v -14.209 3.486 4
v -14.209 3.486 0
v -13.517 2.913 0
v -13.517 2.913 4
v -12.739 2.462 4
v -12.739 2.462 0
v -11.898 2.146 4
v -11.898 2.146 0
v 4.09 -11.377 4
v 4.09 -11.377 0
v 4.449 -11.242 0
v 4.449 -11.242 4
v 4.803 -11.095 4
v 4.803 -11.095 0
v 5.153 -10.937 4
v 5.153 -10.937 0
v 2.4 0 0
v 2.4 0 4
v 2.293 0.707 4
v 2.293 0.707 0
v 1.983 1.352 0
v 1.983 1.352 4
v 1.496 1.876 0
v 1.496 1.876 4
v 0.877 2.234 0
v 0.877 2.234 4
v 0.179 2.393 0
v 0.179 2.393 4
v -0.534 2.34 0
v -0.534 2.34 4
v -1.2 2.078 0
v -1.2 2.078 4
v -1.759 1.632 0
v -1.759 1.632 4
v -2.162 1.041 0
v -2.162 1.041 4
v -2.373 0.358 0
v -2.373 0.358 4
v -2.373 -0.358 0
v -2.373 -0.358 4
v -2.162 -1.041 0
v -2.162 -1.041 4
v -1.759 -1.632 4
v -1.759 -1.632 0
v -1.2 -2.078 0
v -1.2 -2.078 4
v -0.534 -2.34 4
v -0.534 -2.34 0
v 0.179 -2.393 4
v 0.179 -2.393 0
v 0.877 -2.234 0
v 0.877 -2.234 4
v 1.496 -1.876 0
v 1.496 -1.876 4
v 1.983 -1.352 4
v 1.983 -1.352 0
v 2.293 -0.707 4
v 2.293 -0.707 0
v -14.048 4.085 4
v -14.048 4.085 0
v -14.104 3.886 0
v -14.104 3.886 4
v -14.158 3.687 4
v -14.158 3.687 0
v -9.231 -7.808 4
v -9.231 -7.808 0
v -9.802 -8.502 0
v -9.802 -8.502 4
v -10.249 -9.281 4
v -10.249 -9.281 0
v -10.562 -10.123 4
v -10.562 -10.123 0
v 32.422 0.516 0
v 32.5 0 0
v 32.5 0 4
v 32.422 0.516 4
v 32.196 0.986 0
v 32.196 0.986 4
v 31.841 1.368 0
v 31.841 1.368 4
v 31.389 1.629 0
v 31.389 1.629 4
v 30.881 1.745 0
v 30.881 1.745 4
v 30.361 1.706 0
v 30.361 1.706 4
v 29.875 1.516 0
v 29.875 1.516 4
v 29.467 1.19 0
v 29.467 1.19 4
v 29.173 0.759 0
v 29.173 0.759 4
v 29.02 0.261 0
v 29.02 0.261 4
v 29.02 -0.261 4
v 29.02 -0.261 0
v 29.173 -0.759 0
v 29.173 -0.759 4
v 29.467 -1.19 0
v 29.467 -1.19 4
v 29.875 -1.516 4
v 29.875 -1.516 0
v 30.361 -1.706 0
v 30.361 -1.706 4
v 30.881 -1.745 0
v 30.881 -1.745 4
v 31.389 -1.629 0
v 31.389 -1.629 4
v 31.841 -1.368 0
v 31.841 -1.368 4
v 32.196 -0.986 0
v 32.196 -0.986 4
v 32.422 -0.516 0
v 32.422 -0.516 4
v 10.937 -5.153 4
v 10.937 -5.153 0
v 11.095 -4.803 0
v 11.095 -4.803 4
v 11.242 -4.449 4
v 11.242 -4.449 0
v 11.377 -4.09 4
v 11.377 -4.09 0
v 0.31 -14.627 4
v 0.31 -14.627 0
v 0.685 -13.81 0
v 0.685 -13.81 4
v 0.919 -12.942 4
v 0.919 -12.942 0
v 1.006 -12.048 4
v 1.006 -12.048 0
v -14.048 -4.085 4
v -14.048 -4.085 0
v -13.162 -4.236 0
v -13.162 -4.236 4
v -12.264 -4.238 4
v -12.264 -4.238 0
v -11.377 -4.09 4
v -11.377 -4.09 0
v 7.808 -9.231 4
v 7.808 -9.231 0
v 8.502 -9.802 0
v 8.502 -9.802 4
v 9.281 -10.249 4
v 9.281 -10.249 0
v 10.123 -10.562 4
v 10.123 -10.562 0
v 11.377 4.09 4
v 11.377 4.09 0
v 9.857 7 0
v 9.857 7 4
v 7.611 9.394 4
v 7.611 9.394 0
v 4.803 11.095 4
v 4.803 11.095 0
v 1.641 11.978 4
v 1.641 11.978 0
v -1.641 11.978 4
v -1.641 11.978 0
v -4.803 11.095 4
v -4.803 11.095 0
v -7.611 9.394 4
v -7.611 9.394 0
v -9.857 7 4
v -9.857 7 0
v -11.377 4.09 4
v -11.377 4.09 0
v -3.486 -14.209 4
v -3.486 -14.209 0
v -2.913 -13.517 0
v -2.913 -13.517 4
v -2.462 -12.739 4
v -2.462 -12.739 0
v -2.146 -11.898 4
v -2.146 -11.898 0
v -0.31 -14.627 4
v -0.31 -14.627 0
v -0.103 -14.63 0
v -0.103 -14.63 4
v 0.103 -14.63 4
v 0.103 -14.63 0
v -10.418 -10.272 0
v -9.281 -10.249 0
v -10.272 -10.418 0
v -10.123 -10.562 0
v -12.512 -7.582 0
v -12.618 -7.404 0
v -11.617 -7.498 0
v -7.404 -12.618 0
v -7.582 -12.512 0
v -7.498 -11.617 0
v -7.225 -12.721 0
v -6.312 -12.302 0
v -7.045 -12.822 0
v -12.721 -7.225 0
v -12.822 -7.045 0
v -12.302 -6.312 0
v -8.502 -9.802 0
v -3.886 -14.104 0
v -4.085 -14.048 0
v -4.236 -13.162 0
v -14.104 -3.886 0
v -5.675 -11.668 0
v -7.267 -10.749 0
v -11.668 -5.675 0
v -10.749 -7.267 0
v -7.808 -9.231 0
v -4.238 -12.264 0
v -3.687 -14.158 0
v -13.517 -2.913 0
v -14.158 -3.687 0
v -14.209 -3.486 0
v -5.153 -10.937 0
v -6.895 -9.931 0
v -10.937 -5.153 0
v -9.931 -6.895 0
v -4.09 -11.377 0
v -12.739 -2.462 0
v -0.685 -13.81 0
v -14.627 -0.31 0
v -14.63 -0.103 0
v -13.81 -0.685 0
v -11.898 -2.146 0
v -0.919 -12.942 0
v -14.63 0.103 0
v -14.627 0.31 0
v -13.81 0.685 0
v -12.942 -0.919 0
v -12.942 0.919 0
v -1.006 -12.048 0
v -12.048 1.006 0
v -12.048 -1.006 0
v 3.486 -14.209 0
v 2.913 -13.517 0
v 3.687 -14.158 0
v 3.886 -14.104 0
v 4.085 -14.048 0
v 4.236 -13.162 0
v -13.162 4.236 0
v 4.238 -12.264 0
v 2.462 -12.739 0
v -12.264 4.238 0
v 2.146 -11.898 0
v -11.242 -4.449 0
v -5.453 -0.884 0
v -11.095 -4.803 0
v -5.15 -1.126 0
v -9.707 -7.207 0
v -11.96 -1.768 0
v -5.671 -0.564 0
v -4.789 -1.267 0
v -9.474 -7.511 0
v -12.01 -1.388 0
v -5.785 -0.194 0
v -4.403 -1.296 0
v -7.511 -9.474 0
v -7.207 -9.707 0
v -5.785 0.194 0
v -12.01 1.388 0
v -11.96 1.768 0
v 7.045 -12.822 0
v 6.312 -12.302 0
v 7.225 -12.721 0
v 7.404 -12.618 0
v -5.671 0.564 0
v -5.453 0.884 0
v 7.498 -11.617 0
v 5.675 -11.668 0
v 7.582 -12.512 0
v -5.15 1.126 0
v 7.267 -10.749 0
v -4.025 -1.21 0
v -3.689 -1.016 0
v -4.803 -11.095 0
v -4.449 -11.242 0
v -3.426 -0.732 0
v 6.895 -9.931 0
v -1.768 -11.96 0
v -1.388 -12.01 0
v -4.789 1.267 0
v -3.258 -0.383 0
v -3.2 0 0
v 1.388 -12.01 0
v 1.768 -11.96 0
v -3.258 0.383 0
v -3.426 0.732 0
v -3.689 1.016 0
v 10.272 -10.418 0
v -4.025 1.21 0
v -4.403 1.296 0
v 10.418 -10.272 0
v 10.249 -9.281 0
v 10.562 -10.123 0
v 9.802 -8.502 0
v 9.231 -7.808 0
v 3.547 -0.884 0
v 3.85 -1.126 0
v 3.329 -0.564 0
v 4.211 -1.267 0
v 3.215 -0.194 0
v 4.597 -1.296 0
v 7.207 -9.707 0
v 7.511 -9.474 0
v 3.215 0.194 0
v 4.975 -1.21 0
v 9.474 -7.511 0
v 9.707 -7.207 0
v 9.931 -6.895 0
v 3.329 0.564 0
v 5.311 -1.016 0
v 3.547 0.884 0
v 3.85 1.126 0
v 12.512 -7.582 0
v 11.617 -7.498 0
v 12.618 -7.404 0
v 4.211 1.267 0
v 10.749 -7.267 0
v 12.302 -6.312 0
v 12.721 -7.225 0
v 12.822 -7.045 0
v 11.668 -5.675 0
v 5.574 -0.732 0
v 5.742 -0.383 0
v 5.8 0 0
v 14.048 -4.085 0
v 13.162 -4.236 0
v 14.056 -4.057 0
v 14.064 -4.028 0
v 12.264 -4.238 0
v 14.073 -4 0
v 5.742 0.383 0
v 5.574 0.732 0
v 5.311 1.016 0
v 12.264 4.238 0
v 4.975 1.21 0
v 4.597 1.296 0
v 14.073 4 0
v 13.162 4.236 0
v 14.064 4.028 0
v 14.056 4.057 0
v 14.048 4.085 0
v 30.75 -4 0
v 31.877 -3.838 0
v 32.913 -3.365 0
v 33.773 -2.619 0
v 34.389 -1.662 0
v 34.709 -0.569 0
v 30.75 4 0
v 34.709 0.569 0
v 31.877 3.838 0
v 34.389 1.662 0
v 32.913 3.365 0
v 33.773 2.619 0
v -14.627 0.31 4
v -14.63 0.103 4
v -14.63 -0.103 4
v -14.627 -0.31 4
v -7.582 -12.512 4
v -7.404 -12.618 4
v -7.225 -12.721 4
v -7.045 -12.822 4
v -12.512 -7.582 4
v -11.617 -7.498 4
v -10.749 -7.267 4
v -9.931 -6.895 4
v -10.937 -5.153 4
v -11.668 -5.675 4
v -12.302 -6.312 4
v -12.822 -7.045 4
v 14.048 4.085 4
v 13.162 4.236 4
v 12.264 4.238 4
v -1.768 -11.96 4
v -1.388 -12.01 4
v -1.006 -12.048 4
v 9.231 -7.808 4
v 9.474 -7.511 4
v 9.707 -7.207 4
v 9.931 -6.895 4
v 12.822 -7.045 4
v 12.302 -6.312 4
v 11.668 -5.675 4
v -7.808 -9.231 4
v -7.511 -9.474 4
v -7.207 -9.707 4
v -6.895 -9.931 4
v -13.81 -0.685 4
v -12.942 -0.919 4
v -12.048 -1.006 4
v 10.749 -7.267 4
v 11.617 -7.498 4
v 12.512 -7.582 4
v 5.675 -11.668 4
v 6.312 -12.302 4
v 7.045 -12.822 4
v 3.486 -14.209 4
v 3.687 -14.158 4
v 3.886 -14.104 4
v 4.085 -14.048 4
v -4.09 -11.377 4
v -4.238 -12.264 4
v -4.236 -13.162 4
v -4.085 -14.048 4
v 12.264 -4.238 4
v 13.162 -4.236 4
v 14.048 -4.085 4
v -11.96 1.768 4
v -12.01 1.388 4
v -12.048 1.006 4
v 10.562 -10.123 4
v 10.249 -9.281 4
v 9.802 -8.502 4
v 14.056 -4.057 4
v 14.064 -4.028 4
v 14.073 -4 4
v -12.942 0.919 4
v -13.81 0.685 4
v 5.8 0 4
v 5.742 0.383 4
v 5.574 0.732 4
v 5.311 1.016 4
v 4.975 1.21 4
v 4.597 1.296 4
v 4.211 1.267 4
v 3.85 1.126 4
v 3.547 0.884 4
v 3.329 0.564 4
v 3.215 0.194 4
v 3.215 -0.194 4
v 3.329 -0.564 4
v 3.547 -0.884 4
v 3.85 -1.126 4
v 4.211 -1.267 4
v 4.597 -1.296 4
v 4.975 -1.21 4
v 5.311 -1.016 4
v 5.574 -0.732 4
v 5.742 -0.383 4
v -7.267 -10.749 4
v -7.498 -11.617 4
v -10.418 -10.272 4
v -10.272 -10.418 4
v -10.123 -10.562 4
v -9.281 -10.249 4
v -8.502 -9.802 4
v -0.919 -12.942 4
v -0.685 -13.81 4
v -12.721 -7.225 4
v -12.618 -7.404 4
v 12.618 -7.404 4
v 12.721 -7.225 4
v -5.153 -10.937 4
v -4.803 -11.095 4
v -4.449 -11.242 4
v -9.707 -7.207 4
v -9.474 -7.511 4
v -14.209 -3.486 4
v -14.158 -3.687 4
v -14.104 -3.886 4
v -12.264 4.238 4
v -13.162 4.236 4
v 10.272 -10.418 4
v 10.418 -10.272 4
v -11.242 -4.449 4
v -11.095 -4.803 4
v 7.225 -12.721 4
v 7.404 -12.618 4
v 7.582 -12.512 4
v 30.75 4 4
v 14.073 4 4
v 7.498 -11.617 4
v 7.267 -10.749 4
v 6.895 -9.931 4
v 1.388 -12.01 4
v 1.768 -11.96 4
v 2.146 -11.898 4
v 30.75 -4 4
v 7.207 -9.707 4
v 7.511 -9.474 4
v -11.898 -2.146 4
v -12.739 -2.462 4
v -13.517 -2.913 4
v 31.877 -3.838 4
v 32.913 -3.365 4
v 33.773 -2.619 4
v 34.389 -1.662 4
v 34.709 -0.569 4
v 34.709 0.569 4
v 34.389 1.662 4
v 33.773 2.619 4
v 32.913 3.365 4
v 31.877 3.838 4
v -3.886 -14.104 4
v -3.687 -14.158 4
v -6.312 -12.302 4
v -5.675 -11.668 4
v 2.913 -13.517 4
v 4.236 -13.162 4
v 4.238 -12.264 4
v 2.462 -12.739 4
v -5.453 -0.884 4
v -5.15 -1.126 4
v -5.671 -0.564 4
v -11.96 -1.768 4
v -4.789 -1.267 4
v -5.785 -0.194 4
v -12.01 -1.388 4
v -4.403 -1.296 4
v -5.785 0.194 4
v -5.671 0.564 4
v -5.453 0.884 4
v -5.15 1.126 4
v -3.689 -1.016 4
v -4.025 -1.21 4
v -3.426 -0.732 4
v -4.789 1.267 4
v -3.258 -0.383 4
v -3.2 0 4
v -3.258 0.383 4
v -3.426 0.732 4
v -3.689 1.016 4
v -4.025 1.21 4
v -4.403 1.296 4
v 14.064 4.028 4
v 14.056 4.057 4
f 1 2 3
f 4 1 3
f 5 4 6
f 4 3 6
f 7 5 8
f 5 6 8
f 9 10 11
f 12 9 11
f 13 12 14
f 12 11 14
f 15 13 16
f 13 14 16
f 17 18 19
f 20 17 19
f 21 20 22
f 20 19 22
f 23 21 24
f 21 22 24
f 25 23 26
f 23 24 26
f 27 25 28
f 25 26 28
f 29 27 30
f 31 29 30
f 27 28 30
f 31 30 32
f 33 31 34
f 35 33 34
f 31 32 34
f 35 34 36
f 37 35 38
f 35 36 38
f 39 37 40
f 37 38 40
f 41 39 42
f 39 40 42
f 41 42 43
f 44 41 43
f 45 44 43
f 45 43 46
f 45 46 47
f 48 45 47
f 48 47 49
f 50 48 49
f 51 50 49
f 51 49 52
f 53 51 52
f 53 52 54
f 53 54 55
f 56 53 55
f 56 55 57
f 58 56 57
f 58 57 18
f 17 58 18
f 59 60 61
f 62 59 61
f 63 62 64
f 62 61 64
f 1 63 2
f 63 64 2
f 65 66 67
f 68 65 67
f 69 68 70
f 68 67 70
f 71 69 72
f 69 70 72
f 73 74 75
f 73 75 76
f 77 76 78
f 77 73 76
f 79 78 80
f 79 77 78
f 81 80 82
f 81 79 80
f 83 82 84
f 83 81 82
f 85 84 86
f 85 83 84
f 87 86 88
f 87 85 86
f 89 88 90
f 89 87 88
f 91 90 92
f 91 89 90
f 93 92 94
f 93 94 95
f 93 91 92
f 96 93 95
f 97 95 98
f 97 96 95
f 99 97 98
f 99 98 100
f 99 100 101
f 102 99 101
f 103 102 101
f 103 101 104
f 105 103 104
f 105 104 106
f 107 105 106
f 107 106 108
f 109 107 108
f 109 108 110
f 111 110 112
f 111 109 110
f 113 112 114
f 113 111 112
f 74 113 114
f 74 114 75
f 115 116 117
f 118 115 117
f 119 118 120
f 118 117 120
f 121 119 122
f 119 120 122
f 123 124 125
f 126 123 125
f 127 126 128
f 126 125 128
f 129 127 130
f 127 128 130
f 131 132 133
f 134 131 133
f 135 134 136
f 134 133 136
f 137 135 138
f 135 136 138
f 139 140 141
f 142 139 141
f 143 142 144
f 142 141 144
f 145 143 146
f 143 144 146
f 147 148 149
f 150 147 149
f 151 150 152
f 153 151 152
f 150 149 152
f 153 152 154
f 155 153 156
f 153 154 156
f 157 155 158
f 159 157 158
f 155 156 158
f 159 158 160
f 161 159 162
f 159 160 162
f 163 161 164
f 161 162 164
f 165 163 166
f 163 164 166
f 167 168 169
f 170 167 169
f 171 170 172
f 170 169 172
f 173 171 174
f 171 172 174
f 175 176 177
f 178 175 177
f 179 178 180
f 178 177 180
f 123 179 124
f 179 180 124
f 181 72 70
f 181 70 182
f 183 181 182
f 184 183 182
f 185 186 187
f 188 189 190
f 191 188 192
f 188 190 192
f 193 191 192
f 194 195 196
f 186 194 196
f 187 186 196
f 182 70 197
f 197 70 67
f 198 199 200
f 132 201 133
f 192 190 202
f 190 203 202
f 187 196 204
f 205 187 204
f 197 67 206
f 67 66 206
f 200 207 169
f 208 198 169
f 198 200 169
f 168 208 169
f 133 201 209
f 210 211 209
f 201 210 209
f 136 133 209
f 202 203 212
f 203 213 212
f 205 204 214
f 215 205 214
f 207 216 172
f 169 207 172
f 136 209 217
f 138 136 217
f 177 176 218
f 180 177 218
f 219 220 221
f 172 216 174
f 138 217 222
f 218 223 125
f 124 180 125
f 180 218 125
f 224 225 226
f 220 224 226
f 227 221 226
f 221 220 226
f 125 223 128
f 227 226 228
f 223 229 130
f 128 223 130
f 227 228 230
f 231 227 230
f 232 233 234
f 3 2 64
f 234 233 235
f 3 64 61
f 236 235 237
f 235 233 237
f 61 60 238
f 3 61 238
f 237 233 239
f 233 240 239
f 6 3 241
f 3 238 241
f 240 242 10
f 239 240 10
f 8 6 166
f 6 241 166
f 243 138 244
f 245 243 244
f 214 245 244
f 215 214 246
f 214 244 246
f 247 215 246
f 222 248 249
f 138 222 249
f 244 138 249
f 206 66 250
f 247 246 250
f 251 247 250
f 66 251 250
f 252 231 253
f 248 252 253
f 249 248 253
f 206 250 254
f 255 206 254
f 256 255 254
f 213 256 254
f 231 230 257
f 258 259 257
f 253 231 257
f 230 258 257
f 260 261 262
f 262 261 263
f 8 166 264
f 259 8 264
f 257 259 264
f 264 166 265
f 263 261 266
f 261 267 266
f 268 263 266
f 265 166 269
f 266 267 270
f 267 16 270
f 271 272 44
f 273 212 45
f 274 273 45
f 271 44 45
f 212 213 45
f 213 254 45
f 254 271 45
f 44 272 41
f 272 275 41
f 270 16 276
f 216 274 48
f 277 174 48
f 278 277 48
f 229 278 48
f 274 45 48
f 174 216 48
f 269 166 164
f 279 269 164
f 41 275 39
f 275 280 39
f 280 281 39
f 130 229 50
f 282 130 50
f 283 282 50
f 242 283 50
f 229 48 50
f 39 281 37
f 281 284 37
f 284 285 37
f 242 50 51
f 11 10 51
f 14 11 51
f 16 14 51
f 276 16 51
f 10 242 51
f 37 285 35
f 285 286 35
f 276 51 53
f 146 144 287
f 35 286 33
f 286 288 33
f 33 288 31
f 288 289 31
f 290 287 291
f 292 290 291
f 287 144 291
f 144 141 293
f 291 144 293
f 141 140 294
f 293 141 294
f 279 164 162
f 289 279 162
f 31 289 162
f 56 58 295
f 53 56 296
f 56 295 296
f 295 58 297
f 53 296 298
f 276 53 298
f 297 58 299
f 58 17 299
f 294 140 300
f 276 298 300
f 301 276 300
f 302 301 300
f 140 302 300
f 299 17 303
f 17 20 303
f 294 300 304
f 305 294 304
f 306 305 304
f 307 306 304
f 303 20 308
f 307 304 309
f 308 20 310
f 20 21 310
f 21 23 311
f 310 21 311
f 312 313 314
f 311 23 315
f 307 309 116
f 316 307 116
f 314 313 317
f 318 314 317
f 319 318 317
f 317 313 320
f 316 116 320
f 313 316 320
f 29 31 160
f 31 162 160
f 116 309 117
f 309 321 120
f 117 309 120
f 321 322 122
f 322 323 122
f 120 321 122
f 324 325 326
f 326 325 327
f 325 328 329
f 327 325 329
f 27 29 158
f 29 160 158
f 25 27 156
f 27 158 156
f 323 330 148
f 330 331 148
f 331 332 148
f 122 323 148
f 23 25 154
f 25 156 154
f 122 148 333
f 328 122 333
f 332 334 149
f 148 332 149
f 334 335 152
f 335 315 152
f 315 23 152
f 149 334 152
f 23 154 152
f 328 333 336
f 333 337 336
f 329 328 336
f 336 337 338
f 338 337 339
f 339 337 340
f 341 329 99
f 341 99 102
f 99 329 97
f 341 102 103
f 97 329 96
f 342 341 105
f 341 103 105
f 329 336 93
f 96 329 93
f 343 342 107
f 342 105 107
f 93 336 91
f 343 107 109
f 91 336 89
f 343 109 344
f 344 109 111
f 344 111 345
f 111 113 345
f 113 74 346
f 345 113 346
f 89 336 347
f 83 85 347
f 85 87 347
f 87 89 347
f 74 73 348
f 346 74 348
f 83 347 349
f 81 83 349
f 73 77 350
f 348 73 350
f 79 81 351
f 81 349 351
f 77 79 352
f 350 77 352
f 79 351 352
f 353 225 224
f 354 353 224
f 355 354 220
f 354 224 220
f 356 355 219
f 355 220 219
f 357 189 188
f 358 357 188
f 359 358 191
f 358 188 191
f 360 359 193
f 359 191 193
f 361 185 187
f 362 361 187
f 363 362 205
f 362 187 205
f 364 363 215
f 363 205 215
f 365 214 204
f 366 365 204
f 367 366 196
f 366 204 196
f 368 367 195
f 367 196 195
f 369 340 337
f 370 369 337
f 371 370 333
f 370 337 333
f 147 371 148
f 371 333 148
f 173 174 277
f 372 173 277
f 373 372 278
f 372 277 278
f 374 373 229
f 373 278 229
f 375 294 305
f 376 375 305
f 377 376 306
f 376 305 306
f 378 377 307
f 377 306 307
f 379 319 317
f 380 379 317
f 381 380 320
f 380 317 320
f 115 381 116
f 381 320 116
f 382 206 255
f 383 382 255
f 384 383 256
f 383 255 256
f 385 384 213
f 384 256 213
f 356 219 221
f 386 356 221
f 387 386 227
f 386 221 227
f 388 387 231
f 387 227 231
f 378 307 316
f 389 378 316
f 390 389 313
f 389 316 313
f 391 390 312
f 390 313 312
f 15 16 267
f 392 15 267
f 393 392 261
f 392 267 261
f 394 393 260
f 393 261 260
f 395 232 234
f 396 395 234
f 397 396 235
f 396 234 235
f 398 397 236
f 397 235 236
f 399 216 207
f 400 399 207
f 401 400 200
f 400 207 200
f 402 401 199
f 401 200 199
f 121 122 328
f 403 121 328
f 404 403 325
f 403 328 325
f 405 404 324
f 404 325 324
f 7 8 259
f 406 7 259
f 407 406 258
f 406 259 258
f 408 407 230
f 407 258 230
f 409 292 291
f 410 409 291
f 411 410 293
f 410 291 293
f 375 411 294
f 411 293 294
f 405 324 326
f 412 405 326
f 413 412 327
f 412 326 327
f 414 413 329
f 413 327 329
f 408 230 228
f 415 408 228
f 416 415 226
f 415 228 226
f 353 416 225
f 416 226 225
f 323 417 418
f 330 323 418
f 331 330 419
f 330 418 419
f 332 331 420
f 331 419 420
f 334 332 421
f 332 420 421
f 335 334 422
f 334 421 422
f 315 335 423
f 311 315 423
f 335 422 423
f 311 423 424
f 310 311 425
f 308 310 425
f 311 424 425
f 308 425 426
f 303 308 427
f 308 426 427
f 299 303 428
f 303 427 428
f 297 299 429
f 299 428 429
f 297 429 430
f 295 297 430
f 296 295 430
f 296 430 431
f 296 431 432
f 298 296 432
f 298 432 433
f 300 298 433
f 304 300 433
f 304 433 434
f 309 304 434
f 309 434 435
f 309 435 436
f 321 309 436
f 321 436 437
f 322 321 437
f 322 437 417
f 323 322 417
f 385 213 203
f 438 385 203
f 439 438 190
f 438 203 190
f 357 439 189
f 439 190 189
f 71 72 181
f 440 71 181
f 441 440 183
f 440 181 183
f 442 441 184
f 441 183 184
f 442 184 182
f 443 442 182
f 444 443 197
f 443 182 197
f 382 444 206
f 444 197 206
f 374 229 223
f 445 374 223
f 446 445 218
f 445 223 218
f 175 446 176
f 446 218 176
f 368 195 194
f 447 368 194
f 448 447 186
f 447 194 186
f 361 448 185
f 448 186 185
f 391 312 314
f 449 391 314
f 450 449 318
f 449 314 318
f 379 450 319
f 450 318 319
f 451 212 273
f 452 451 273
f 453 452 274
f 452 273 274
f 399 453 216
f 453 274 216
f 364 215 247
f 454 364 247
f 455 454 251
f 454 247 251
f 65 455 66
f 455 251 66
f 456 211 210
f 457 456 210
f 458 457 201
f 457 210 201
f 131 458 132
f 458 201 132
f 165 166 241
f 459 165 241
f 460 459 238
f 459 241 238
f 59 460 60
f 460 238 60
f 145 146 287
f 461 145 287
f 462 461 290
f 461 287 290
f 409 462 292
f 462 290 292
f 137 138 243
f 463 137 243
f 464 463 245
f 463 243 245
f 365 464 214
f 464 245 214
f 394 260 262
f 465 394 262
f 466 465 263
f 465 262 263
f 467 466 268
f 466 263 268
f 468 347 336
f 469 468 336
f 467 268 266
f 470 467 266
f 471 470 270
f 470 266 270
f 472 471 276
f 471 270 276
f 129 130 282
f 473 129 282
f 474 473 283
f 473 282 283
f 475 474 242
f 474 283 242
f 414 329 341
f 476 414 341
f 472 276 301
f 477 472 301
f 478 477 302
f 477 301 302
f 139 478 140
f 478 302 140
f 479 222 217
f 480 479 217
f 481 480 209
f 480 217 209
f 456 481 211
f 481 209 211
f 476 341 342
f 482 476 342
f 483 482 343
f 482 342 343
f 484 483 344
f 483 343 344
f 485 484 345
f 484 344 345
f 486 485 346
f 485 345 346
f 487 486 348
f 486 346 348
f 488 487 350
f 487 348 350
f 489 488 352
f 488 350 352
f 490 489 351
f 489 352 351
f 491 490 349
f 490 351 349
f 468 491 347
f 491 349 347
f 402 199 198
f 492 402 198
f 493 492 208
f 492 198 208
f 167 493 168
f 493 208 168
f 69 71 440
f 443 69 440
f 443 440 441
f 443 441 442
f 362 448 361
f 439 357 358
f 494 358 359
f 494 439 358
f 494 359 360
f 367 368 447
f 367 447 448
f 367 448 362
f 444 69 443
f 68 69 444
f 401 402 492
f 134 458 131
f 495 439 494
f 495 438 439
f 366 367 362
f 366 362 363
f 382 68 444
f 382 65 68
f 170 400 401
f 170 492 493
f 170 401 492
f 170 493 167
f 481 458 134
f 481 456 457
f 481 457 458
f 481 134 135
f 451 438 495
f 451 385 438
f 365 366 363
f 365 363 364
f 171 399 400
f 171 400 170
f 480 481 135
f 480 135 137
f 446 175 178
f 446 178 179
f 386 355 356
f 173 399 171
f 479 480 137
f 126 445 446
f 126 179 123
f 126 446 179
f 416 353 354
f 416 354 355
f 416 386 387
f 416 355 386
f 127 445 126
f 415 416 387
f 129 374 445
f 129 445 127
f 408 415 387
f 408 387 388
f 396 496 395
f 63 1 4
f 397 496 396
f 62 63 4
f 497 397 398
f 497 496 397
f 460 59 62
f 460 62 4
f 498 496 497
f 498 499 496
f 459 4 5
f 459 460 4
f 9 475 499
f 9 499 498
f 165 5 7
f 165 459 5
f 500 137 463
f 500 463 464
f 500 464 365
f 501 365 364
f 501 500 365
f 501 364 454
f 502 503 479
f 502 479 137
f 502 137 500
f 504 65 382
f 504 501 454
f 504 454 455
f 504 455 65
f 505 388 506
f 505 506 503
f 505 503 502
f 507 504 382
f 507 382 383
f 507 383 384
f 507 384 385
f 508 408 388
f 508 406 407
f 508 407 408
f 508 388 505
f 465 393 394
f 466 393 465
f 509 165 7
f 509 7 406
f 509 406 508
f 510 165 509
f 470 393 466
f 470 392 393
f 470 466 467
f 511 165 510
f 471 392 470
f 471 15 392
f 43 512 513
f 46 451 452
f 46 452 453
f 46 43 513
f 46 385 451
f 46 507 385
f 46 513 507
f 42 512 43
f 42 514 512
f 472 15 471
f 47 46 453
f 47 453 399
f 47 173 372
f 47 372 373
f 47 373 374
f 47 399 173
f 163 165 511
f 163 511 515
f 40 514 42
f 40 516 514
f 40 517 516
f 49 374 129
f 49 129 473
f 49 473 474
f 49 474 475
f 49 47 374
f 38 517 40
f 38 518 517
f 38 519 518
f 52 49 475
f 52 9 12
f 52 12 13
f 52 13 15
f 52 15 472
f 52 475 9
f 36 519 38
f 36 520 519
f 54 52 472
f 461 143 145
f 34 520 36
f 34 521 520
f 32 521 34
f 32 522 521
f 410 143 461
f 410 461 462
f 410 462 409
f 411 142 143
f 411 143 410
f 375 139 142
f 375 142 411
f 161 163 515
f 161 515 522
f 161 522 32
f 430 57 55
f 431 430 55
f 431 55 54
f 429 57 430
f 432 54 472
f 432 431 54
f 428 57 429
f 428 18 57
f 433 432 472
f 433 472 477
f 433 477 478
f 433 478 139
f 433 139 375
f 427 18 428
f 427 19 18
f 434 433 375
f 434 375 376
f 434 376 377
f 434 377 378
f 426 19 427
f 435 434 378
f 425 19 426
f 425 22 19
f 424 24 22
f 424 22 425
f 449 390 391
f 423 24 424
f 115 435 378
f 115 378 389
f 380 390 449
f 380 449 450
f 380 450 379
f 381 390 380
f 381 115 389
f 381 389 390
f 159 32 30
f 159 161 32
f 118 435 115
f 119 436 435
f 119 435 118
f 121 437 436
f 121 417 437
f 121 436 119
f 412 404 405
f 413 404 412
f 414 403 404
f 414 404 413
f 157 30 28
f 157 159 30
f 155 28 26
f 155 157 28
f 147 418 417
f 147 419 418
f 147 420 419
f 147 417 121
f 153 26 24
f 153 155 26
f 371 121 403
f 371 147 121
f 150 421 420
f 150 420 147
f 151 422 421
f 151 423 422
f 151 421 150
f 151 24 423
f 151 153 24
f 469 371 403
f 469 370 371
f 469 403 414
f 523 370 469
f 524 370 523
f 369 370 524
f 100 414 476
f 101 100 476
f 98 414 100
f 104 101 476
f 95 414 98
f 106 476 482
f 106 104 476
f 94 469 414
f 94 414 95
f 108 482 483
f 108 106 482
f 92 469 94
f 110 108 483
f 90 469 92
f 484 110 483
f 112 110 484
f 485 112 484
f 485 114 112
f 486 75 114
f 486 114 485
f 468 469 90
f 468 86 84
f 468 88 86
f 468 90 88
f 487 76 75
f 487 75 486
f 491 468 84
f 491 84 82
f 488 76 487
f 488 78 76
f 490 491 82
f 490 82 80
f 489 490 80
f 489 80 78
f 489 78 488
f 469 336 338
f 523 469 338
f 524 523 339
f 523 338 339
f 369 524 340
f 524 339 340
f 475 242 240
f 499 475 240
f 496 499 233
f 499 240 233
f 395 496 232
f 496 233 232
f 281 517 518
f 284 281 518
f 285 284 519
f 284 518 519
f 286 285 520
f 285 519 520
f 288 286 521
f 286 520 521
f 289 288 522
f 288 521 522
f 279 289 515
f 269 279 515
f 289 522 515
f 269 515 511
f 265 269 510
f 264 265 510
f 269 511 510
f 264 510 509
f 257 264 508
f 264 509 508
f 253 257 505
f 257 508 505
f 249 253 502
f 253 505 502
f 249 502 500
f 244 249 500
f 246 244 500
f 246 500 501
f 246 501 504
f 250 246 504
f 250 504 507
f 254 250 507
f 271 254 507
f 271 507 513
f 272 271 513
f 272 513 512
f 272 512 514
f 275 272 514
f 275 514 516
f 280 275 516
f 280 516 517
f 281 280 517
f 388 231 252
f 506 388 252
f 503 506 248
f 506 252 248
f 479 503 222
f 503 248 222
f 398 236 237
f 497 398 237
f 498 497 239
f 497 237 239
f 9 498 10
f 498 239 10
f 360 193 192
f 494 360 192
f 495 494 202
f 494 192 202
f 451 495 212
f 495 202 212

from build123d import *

# Parameters (mm, degrees)
SKETCH1_R           = 1.75
BOSS_EXTRUDE1_DEPTH = 4
SKETCH6_R           = 1.3
SKETCH6_R_2         = 2.4
CUT_EXTRUDE1_DEPTH  = 38.915688046


with BuildPart() as part:
    # Sketch1 → Boss-Extrude1 (new body)
    with BuildSketch(Plane.XY):
        with BuildLine():
            ThreePointArc((14.048088143, -4.085109489), (14.06038767, -4.04257326), (14.072558403, -4))
            Line((14.072558403, -4), (30.75, -4))
            ThreePointArc((30.75, -4), (34.75, 0), (30.75, 4))
            Line((30.75, 4), (14.072558403, 4))
            ThreePointArc((14.072558403, 4), (14.06038767, 4.04257326), (14.048088143, 4.085109489))
            ThreePointArc((14.048088143, 4.085109489), (12.712915648, 4.255390909), (11.377106712, 4.090176385))
            ThreePointArc((11.377106712, 4.090176385), (0, 12.09), (-11.377106712, 4.090176385))
            ThreePointArc((-11.377106712, 4.090176385), (-12.712915648, 4.255390909), (-14.048088143, 4.085109489))
            ThreePointArc((-14.048088143, 4.085109489), (-14.131494839, 3.78652263), (-14.208555951, 3.486235477))
            ThreePointArc((-14.208555951, 3.486235477), (-13.137403362, 2.671181194), (-11.897951627, 2.1463567))
            ThreePointArc((-11.897951627, 2.1463567), (-11.986568374, 1.578061664), (-12.048056748, 1.00619511))
            ThreePointArc((-12.048056748, 1.00619511), (-13.381109763, 0.820047291), (-14.626715284, 0.31))
            ThreePointArc((-14.626715284, 0.31), (-14.63, 0), (-14.626715284, -0.31))
            ThreePointArc((-14.626715284, -0.31), (-13.381109763, -0.820047291), (-12.048056748, -1.00619511))
            ThreePointArc((-12.048056748, -1.00619511), (-11.986568374, -1.578061664), (-11.897951627, -2.1463567))
            ThreePointArc((-11.897951627, -2.1463567), (-13.137403362, -2.671181194), (-14.208555951, -3.486235477))
            ThreePointArc((-14.208555951, -3.486235477), (-14.131494839, -3.78652263), (-14.048088143, -4.085109489))
            ThreePointArc((-14.048088143, -4.085109489), (-12.712915648, -4.255390909), (-11.377106712, -4.090176385))
            ThreePointArc((-11.377106712, -4.090176385), (-11.169703548, -4.626642697), (-10.937020765, -5.152637848))
            ThreePointArc((-10.937020765, -5.152637848), (-11.998404632, -5.980373095), (-12.82210701, -7.044889767))
            ThreePointArc((-12.82210701, -7.044889767), (-12.669951657, -7.315), (-12.51210701, -7.581825517))
            ThreePointArc((-12.51210701, -7.581825517), (-11.17835734, -7.400736668), (-9.930825655, -6.8954189))
            ThreePointArc((-9.930825655, -6.8954189), (-9.591641884, -7.359925677), (-9.230750012, -7.807775241))
            ThreePointArc((-9.230750012, -7.807775241), (-10.041734454, -8.882012453), (-10.561852666, -10.123446462))
            ThreePointArc((-10.561852666, -10.123446462), (-10.344972209, -10.344972209), (-10.123446462, -10.561852666))
            ThreePointArc((-10.123446462, -10.561852666), (-8.882012453, -10.041734454), (-7.807775241, -9.230750012))
            ThreePointArc((-7.807775241, -9.230750012), (-7.359925677, -9.591641884), (-6.8954189, -9.930825655))
            ThreePointArc((-6.8954189, -9.930825655), (-7.400736668, -11.17835734), (-7.581825517, -12.51210701))
            ThreePointArc((-7.581825517, -12.51210701), (-7.315, -12.669951657), (-7.044889767, -12.82210701))
            ThreePointArc((-7.044889767, -12.82210701), (-5.980373095, -11.998404632), (-5.152637848, -10.937020765))
            ThreePointArc((-5.152637848, -10.937020765), (-4.626642697, -11.169703548), (-4.090176385, -11.377106712))
            ThreePointArc((-4.090176385, -11.377106712), (-4.255390909, -12.712915648), (-4.085109489, -14.048088143))
            ThreePointArc((-4.085109489, -14.048088143), (-3.78652263, -14.131494839), (-3.486235477, -14.208555951))
            ThreePointArc((-3.486235477, -14.208555951), (-2.671181194, -13.137403362), (-2.1463567, -11.897951627))
            ThreePointArc((-2.1463567, -11.897951627), (-1.578061664, -11.986568374), (-1.00619511, -12.048056748))
            ThreePointArc((-1.00619511, -12.048056748), (-0.820047291, -13.381109763), (-0.31, -14.626715284))
            ThreePointArc((-0.31, -14.626715284), (0, -14.63), (0.31, -14.626715284))
            ThreePointArc((0.31, -14.626715284), (0.820047291, -13.381109763), (1.00619511, -12.048056748))
            ThreePointArc((1.00619511, -12.048056748), (1.578061664, -11.986568374), (2.1463567, -11.897951627))
            ThreePointArc((2.1463567, -11.897951627), (2.671181194, -13.137403362), (3.486235477, -14.208555951))
            ThreePointArc((3.486235477, -14.208555951), (3.78652263, -14.131494839), (4.085109489, -14.048088143))
            ThreePointArc((4.085109489, -14.048088143), (4.255390909, -12.712915648), (4.090176385, -11.377106712))
            ThreePointArc((4.090176385, -11.377106712), (4.626642697, -11.169703548), (5.152637848, -10.937020765))
            ThreePointArc((5.152637848, -10.937020765), (5.980373095, -11.998404632), (7.044889767, -12.82210701))
            ThreePointArc((7.044889767, -12.82210701), (7.315, -12.669951657), (7.581825517, -12.51210701))
            ThreePointArc((7.581825517, -12.51210701), (7.400736668, -11.17835734), (6.8954189, -9.930825655))
            ThreePointArc((6.8954189, -9.930825655), (7.359925677, -9.591641884), (7.807775241, -9.230750012))
            ThreePointArc((7.807775241, -9.230750012), (8.882012453, -10.041734454), (10.123446462, -10.561852666))
            ThreePointArc((10.123446462, -10.561852666), (10.344972209, -10.344972209), (10.561852666, -10.123446462))
            ThreePointArc((10.561852666, -10.123446462), (10.041734454, -8.882012453), (9.230750012, -7.807775241))
            ThreePointArc((9.230750012, -7.807775241), (9.591641884, -7.359925677), (9.930825655, -6.8954189))
            ThreePointArc((9.930825655, -6.8954189), (11.17835734, -7.400736668), (12.51210701, -7.581825517))
            ThreePointArc((12.51210701, -7.581825517), (12.669951657, -7.315), (12.82210701, -7.044889767))
            ThreePointArc((12.82210701, -7.044889767), (11.998404632, -5.980373095), (10.937020765, -5.152637848))
            ThreePointArc((10.937020765, -5.152637848), (11.169703548, -4.626642697), (11.377106712, -4.090176385))
            ThreePointArc((11.377106712, -4.090176385), (12.712915648, -4.255390909), (14.048088143, -4.085109489))
        make_face()
        Circle(SKETCH1_R, mode=Mode.SUBTRACT)
        with Locations((30.75, 0)):
            Circle(SKETCH1_R, mode=Mode.SUBTRACT)
    extrude(amount=BOSS_EXTRUDE1_DEPTH)

    # Sketch6 → Cut-Extrude1 (cut, through all)
    with BuildSketch(Plane.XY.offset(4)):
        with Locations((4.5, 0)):
            Circle(SKETCH6_R)
        with Locations((-4.5, 0)):
            Circle(SKETCH6_R)
        Circle(SKETCH6_R_2)
    extrude(amount=-CUT_EXTRUDE1_DEPTH, mode=Mode.SUBTRACT)


solid = part.part
